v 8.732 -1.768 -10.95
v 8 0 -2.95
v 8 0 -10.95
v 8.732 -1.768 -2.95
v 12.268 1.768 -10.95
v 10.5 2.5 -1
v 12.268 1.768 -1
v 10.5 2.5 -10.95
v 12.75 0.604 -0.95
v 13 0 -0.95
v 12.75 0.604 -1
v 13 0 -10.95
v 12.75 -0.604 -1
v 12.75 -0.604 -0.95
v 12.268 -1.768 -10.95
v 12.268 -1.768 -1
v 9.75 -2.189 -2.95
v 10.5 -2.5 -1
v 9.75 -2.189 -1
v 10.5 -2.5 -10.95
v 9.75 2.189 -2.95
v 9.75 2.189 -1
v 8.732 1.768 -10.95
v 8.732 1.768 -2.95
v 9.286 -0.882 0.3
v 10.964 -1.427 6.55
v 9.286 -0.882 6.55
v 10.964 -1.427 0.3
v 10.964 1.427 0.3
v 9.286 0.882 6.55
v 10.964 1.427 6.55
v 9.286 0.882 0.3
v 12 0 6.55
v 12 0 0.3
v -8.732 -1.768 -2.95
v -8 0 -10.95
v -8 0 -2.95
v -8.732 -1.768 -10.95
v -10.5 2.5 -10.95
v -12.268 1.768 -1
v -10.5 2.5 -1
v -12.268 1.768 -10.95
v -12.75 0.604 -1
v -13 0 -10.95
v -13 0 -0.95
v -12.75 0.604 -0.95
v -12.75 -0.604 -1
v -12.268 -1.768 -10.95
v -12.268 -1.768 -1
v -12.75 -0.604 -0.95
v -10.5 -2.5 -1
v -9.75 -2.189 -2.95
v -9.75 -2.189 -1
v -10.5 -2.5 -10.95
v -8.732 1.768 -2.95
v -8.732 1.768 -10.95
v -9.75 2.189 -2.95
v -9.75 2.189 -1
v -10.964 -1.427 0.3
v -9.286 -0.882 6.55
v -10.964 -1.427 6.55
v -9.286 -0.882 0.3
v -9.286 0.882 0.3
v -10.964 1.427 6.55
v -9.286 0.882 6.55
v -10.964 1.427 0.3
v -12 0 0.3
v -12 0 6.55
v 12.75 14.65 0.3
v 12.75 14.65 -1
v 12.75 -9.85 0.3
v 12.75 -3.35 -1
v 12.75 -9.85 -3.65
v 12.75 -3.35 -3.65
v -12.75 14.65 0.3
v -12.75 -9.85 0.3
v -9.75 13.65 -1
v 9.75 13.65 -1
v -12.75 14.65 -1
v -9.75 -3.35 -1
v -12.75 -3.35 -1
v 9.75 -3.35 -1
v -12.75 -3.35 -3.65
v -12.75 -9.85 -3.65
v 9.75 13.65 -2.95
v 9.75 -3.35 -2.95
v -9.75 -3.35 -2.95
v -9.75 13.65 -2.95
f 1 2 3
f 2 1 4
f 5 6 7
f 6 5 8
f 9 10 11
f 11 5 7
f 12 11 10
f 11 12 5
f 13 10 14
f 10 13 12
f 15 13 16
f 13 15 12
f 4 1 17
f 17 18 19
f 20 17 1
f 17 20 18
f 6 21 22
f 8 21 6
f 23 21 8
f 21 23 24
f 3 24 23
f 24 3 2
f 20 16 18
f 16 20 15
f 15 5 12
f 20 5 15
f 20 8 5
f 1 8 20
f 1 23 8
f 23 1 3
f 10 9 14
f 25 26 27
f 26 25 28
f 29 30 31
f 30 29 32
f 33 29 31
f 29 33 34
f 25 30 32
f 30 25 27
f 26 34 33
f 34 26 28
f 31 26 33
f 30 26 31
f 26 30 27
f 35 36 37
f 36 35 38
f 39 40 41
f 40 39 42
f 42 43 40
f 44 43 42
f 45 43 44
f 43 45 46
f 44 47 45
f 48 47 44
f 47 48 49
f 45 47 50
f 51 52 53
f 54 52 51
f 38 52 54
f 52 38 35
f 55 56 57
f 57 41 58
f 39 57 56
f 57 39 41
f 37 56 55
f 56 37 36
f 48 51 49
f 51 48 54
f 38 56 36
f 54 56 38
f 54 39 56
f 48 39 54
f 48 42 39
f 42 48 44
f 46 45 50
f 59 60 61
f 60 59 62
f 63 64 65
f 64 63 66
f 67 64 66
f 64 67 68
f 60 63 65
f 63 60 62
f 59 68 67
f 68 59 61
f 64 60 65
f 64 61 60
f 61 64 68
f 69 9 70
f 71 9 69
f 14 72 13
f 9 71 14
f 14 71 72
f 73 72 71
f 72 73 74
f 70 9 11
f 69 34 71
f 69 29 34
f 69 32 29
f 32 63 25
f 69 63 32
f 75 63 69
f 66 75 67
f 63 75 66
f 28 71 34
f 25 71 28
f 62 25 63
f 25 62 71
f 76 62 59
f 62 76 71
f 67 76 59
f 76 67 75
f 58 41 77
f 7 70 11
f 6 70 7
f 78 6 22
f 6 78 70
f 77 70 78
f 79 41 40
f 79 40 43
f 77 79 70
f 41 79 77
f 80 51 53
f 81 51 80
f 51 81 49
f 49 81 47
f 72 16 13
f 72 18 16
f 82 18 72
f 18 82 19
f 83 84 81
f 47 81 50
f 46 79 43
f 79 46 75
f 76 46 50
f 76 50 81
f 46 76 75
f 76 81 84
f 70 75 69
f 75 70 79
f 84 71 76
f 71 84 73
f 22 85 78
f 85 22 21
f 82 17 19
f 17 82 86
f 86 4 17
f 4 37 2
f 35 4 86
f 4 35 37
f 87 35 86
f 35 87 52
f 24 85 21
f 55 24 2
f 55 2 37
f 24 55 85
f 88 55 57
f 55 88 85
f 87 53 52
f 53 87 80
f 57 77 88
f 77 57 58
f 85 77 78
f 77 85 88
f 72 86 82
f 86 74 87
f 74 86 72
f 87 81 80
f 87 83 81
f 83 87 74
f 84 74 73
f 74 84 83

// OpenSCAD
use <utilities.scad>;


//outer_r=8.5;   //square side length
//f=0.5; //feather amount
d=0.05; //small distance!


module camera_bits(){
	union(){
		translate([0,6.5+5,0]) cube([8.5,10,3],center=true);
		translate([7,10,0]) cube([4,3,2],center=true);
	}
}

module picam_push_fit(){
    // This uses four slightly flexible fingers to grip the
    // camera module.  It's designed to be subtracted from a
    // larger shape, and needs space above it.
    // it's often a bit too stiff, and tends to rotate the
    // camera slightly.  v2 is better (see below).
	assign(r=8-0.25) //un-flexed side length of camera box
	assign(finger_w=2) //width of flexure "fingers"
	assign(chamfer=0.75) //How much to shrink the bottom layer
	union(){
		//very tight cut-out for camera
		sequential_hull(){
			cube([r+chamfer*2,r+chamfer*2,d],center=true);
			cube([r,r,chamfer*2],center=true);
			cube([r,r,40],center=true);
		}
		for(a=[0:90:360]) rotate(a){
			translate([0,r/2-1,0.48]) cube([r/2+finger_w+1,1,20]);
			translate([r/2+finger_w,-r/2,-d]) cube([1,r,20]);
		}
		camera_bits();

		//screw holes for safety (M2 "threaded")
		reflect([1,0,0]) translate([21/2,0,0]) cylinder(r=1,h=10);
	}
}



module picam_push_fit_2( beam_length=15){
    // This module is designed to be subtracted from the bottom of a shape.
    // The z=0 plane should be the print bed.
    // It includes cut-outs for the components on the PCB and also a push-fit hole
    // for the camera module.  This uses flexible "fingers" to grip the camera firmly
    // but gently.  Just push to insert, and wiggle to remove.  You may find popping 
    // off the brown ribbon cable and removing the PCB first helps when extracting
    // the camera module again.
    camera = [8,8,3]; //size of camera box
	cw = camera[0]+1; //side length of camera box at bottom (slightly larger)
	finger_w = 1.5; //width of flexure "fingers"
	flex_l = 1; //width of flexible part
    hole_r = camera[0]/2-0.5;
	union(){
		//cut-out for camera
        hull(){
            translate([0,0,-d]) cube([cw+0.5,cw+0.5,d],center=true); //hole for camera
            translate([0,0,1]) cube([cw-0.5,cw-0.5,d],center=true); //hole for camera
        }
        rotate(180/16) cylinder(r=hole_r,h=20,center=true,$fn=16); //hole for light
        
        //looser cut-out for camera, with gripping "fingers" on 3 sides
        difference(){
            //cut-out big enough to include gripping fingers
            intersection(){
                translate([-cw/2-finger_w-flex_l,-cw/2-finger_w-flex_l,0.5])
                    cube([cw+2*finger_w+2*flex_l,
                        cw+finger_w+flex_l,
                        999]);
                //build up the roof gradually so we get a nice hole
                rotate(90) translate([0,0,camera[2]+1.5]) hole_from_bottom(r=hole_r,base_w=cw+2*finger_w+2*flex_l,h=beam_length - camera[2]-1.5);
            }
                
            //gripping "fingers" (NB we subtract these from the cut-out)
            for(a=[90:90:270]) rotate(a) hull(){
                translate([-cw/2+0.5,cw/2,0]) cube([cw-1,finger_w,d]);
                translate([-cw/2+1,camera[0]/2-0.1,camera[2]]) cube([cw-2,finger_w,d]);
            }
            //there's no finger on the top, so add a dimple on the fourth side
            hull(){
                translate([-cw/2+1,cw/2,2]) cube([cw-2,d,camera[2]-2]);
                translate([-cw/2+2,camera[1]/2,camera[2]-0.5]) cube([cw-4,d,0.5]);
            }
		}
        
		//ribbon cable at top of camera
        translate([0,(9.5+5)/2+cw/2-d,0]) cube([cw,9.5+5,4],center=true);
        //resistor/LED
		translate([7,10,0]) cube([4+2,3,2],center=true);
        translate([7+1,8.5,0.3]) cube([1,13,1]); //channel so we can see the LED
                //NB the LED channel is deliberately high to aid adhesion

		//screw holes for safety (M2 "threaded")
		reflect([1,0,0]) translate([21/2,0,0]) cylinder(r=1,h=10,center=true);
	}
}

//difference(){
//    translate([-12.5,-12+2.4,0]) cube([25,24,6]);
//    picam_push_fit_2();
//}

module picam_pcb_bottom(){
    // This is an approximate model of the pi camera PCB for the purposes of making
    // a slide-on cover.  NB z=0 is the bottom of the PCB, which is nominally 1mm thick.
    pcb = [25+0.5,24+0.5,1+0.3];
    socket = [pcb[0],6.0+0.5,2.7];
    components = [pcb[0]-3*2, pcb[1]-1-socket[1], 2];
    translate([0,2.4,0]) union(){ //NB the camera bit isn't centred!
        translate([0,0,pcb[2]/2]) cube(pcb,center=true); //the PCB
        translate([-components[0]/2,-pcb[1]/2+socket[1],-components[2]+d]) cube(components); //the little components
        //the ribbon cable socket
        translate([-socket[0]/2,-pcb[1]/2,-socket[2]+d]) cube(socket); //the ribbon cable socket
        translate([-components[0]/2,-pcb[1]/2,-0.5]) cube([components[0],socket[1]+0.5,0.5+d]); //pins protrude slightly further
        
        //mounting screws (NB could be extruded in -y so the cover can slide on)
        reflect([1,0,0]) mirror([0,0,1]) translate([21/2,-2.4,-d]){
            cylinder(r=2.5,h=10);
            cylinder(r=1.5,h=15,center=true); //screw might poke through the top...
        }
    }
}
translate([0,0,-1]) picam_pcb_bottom();
